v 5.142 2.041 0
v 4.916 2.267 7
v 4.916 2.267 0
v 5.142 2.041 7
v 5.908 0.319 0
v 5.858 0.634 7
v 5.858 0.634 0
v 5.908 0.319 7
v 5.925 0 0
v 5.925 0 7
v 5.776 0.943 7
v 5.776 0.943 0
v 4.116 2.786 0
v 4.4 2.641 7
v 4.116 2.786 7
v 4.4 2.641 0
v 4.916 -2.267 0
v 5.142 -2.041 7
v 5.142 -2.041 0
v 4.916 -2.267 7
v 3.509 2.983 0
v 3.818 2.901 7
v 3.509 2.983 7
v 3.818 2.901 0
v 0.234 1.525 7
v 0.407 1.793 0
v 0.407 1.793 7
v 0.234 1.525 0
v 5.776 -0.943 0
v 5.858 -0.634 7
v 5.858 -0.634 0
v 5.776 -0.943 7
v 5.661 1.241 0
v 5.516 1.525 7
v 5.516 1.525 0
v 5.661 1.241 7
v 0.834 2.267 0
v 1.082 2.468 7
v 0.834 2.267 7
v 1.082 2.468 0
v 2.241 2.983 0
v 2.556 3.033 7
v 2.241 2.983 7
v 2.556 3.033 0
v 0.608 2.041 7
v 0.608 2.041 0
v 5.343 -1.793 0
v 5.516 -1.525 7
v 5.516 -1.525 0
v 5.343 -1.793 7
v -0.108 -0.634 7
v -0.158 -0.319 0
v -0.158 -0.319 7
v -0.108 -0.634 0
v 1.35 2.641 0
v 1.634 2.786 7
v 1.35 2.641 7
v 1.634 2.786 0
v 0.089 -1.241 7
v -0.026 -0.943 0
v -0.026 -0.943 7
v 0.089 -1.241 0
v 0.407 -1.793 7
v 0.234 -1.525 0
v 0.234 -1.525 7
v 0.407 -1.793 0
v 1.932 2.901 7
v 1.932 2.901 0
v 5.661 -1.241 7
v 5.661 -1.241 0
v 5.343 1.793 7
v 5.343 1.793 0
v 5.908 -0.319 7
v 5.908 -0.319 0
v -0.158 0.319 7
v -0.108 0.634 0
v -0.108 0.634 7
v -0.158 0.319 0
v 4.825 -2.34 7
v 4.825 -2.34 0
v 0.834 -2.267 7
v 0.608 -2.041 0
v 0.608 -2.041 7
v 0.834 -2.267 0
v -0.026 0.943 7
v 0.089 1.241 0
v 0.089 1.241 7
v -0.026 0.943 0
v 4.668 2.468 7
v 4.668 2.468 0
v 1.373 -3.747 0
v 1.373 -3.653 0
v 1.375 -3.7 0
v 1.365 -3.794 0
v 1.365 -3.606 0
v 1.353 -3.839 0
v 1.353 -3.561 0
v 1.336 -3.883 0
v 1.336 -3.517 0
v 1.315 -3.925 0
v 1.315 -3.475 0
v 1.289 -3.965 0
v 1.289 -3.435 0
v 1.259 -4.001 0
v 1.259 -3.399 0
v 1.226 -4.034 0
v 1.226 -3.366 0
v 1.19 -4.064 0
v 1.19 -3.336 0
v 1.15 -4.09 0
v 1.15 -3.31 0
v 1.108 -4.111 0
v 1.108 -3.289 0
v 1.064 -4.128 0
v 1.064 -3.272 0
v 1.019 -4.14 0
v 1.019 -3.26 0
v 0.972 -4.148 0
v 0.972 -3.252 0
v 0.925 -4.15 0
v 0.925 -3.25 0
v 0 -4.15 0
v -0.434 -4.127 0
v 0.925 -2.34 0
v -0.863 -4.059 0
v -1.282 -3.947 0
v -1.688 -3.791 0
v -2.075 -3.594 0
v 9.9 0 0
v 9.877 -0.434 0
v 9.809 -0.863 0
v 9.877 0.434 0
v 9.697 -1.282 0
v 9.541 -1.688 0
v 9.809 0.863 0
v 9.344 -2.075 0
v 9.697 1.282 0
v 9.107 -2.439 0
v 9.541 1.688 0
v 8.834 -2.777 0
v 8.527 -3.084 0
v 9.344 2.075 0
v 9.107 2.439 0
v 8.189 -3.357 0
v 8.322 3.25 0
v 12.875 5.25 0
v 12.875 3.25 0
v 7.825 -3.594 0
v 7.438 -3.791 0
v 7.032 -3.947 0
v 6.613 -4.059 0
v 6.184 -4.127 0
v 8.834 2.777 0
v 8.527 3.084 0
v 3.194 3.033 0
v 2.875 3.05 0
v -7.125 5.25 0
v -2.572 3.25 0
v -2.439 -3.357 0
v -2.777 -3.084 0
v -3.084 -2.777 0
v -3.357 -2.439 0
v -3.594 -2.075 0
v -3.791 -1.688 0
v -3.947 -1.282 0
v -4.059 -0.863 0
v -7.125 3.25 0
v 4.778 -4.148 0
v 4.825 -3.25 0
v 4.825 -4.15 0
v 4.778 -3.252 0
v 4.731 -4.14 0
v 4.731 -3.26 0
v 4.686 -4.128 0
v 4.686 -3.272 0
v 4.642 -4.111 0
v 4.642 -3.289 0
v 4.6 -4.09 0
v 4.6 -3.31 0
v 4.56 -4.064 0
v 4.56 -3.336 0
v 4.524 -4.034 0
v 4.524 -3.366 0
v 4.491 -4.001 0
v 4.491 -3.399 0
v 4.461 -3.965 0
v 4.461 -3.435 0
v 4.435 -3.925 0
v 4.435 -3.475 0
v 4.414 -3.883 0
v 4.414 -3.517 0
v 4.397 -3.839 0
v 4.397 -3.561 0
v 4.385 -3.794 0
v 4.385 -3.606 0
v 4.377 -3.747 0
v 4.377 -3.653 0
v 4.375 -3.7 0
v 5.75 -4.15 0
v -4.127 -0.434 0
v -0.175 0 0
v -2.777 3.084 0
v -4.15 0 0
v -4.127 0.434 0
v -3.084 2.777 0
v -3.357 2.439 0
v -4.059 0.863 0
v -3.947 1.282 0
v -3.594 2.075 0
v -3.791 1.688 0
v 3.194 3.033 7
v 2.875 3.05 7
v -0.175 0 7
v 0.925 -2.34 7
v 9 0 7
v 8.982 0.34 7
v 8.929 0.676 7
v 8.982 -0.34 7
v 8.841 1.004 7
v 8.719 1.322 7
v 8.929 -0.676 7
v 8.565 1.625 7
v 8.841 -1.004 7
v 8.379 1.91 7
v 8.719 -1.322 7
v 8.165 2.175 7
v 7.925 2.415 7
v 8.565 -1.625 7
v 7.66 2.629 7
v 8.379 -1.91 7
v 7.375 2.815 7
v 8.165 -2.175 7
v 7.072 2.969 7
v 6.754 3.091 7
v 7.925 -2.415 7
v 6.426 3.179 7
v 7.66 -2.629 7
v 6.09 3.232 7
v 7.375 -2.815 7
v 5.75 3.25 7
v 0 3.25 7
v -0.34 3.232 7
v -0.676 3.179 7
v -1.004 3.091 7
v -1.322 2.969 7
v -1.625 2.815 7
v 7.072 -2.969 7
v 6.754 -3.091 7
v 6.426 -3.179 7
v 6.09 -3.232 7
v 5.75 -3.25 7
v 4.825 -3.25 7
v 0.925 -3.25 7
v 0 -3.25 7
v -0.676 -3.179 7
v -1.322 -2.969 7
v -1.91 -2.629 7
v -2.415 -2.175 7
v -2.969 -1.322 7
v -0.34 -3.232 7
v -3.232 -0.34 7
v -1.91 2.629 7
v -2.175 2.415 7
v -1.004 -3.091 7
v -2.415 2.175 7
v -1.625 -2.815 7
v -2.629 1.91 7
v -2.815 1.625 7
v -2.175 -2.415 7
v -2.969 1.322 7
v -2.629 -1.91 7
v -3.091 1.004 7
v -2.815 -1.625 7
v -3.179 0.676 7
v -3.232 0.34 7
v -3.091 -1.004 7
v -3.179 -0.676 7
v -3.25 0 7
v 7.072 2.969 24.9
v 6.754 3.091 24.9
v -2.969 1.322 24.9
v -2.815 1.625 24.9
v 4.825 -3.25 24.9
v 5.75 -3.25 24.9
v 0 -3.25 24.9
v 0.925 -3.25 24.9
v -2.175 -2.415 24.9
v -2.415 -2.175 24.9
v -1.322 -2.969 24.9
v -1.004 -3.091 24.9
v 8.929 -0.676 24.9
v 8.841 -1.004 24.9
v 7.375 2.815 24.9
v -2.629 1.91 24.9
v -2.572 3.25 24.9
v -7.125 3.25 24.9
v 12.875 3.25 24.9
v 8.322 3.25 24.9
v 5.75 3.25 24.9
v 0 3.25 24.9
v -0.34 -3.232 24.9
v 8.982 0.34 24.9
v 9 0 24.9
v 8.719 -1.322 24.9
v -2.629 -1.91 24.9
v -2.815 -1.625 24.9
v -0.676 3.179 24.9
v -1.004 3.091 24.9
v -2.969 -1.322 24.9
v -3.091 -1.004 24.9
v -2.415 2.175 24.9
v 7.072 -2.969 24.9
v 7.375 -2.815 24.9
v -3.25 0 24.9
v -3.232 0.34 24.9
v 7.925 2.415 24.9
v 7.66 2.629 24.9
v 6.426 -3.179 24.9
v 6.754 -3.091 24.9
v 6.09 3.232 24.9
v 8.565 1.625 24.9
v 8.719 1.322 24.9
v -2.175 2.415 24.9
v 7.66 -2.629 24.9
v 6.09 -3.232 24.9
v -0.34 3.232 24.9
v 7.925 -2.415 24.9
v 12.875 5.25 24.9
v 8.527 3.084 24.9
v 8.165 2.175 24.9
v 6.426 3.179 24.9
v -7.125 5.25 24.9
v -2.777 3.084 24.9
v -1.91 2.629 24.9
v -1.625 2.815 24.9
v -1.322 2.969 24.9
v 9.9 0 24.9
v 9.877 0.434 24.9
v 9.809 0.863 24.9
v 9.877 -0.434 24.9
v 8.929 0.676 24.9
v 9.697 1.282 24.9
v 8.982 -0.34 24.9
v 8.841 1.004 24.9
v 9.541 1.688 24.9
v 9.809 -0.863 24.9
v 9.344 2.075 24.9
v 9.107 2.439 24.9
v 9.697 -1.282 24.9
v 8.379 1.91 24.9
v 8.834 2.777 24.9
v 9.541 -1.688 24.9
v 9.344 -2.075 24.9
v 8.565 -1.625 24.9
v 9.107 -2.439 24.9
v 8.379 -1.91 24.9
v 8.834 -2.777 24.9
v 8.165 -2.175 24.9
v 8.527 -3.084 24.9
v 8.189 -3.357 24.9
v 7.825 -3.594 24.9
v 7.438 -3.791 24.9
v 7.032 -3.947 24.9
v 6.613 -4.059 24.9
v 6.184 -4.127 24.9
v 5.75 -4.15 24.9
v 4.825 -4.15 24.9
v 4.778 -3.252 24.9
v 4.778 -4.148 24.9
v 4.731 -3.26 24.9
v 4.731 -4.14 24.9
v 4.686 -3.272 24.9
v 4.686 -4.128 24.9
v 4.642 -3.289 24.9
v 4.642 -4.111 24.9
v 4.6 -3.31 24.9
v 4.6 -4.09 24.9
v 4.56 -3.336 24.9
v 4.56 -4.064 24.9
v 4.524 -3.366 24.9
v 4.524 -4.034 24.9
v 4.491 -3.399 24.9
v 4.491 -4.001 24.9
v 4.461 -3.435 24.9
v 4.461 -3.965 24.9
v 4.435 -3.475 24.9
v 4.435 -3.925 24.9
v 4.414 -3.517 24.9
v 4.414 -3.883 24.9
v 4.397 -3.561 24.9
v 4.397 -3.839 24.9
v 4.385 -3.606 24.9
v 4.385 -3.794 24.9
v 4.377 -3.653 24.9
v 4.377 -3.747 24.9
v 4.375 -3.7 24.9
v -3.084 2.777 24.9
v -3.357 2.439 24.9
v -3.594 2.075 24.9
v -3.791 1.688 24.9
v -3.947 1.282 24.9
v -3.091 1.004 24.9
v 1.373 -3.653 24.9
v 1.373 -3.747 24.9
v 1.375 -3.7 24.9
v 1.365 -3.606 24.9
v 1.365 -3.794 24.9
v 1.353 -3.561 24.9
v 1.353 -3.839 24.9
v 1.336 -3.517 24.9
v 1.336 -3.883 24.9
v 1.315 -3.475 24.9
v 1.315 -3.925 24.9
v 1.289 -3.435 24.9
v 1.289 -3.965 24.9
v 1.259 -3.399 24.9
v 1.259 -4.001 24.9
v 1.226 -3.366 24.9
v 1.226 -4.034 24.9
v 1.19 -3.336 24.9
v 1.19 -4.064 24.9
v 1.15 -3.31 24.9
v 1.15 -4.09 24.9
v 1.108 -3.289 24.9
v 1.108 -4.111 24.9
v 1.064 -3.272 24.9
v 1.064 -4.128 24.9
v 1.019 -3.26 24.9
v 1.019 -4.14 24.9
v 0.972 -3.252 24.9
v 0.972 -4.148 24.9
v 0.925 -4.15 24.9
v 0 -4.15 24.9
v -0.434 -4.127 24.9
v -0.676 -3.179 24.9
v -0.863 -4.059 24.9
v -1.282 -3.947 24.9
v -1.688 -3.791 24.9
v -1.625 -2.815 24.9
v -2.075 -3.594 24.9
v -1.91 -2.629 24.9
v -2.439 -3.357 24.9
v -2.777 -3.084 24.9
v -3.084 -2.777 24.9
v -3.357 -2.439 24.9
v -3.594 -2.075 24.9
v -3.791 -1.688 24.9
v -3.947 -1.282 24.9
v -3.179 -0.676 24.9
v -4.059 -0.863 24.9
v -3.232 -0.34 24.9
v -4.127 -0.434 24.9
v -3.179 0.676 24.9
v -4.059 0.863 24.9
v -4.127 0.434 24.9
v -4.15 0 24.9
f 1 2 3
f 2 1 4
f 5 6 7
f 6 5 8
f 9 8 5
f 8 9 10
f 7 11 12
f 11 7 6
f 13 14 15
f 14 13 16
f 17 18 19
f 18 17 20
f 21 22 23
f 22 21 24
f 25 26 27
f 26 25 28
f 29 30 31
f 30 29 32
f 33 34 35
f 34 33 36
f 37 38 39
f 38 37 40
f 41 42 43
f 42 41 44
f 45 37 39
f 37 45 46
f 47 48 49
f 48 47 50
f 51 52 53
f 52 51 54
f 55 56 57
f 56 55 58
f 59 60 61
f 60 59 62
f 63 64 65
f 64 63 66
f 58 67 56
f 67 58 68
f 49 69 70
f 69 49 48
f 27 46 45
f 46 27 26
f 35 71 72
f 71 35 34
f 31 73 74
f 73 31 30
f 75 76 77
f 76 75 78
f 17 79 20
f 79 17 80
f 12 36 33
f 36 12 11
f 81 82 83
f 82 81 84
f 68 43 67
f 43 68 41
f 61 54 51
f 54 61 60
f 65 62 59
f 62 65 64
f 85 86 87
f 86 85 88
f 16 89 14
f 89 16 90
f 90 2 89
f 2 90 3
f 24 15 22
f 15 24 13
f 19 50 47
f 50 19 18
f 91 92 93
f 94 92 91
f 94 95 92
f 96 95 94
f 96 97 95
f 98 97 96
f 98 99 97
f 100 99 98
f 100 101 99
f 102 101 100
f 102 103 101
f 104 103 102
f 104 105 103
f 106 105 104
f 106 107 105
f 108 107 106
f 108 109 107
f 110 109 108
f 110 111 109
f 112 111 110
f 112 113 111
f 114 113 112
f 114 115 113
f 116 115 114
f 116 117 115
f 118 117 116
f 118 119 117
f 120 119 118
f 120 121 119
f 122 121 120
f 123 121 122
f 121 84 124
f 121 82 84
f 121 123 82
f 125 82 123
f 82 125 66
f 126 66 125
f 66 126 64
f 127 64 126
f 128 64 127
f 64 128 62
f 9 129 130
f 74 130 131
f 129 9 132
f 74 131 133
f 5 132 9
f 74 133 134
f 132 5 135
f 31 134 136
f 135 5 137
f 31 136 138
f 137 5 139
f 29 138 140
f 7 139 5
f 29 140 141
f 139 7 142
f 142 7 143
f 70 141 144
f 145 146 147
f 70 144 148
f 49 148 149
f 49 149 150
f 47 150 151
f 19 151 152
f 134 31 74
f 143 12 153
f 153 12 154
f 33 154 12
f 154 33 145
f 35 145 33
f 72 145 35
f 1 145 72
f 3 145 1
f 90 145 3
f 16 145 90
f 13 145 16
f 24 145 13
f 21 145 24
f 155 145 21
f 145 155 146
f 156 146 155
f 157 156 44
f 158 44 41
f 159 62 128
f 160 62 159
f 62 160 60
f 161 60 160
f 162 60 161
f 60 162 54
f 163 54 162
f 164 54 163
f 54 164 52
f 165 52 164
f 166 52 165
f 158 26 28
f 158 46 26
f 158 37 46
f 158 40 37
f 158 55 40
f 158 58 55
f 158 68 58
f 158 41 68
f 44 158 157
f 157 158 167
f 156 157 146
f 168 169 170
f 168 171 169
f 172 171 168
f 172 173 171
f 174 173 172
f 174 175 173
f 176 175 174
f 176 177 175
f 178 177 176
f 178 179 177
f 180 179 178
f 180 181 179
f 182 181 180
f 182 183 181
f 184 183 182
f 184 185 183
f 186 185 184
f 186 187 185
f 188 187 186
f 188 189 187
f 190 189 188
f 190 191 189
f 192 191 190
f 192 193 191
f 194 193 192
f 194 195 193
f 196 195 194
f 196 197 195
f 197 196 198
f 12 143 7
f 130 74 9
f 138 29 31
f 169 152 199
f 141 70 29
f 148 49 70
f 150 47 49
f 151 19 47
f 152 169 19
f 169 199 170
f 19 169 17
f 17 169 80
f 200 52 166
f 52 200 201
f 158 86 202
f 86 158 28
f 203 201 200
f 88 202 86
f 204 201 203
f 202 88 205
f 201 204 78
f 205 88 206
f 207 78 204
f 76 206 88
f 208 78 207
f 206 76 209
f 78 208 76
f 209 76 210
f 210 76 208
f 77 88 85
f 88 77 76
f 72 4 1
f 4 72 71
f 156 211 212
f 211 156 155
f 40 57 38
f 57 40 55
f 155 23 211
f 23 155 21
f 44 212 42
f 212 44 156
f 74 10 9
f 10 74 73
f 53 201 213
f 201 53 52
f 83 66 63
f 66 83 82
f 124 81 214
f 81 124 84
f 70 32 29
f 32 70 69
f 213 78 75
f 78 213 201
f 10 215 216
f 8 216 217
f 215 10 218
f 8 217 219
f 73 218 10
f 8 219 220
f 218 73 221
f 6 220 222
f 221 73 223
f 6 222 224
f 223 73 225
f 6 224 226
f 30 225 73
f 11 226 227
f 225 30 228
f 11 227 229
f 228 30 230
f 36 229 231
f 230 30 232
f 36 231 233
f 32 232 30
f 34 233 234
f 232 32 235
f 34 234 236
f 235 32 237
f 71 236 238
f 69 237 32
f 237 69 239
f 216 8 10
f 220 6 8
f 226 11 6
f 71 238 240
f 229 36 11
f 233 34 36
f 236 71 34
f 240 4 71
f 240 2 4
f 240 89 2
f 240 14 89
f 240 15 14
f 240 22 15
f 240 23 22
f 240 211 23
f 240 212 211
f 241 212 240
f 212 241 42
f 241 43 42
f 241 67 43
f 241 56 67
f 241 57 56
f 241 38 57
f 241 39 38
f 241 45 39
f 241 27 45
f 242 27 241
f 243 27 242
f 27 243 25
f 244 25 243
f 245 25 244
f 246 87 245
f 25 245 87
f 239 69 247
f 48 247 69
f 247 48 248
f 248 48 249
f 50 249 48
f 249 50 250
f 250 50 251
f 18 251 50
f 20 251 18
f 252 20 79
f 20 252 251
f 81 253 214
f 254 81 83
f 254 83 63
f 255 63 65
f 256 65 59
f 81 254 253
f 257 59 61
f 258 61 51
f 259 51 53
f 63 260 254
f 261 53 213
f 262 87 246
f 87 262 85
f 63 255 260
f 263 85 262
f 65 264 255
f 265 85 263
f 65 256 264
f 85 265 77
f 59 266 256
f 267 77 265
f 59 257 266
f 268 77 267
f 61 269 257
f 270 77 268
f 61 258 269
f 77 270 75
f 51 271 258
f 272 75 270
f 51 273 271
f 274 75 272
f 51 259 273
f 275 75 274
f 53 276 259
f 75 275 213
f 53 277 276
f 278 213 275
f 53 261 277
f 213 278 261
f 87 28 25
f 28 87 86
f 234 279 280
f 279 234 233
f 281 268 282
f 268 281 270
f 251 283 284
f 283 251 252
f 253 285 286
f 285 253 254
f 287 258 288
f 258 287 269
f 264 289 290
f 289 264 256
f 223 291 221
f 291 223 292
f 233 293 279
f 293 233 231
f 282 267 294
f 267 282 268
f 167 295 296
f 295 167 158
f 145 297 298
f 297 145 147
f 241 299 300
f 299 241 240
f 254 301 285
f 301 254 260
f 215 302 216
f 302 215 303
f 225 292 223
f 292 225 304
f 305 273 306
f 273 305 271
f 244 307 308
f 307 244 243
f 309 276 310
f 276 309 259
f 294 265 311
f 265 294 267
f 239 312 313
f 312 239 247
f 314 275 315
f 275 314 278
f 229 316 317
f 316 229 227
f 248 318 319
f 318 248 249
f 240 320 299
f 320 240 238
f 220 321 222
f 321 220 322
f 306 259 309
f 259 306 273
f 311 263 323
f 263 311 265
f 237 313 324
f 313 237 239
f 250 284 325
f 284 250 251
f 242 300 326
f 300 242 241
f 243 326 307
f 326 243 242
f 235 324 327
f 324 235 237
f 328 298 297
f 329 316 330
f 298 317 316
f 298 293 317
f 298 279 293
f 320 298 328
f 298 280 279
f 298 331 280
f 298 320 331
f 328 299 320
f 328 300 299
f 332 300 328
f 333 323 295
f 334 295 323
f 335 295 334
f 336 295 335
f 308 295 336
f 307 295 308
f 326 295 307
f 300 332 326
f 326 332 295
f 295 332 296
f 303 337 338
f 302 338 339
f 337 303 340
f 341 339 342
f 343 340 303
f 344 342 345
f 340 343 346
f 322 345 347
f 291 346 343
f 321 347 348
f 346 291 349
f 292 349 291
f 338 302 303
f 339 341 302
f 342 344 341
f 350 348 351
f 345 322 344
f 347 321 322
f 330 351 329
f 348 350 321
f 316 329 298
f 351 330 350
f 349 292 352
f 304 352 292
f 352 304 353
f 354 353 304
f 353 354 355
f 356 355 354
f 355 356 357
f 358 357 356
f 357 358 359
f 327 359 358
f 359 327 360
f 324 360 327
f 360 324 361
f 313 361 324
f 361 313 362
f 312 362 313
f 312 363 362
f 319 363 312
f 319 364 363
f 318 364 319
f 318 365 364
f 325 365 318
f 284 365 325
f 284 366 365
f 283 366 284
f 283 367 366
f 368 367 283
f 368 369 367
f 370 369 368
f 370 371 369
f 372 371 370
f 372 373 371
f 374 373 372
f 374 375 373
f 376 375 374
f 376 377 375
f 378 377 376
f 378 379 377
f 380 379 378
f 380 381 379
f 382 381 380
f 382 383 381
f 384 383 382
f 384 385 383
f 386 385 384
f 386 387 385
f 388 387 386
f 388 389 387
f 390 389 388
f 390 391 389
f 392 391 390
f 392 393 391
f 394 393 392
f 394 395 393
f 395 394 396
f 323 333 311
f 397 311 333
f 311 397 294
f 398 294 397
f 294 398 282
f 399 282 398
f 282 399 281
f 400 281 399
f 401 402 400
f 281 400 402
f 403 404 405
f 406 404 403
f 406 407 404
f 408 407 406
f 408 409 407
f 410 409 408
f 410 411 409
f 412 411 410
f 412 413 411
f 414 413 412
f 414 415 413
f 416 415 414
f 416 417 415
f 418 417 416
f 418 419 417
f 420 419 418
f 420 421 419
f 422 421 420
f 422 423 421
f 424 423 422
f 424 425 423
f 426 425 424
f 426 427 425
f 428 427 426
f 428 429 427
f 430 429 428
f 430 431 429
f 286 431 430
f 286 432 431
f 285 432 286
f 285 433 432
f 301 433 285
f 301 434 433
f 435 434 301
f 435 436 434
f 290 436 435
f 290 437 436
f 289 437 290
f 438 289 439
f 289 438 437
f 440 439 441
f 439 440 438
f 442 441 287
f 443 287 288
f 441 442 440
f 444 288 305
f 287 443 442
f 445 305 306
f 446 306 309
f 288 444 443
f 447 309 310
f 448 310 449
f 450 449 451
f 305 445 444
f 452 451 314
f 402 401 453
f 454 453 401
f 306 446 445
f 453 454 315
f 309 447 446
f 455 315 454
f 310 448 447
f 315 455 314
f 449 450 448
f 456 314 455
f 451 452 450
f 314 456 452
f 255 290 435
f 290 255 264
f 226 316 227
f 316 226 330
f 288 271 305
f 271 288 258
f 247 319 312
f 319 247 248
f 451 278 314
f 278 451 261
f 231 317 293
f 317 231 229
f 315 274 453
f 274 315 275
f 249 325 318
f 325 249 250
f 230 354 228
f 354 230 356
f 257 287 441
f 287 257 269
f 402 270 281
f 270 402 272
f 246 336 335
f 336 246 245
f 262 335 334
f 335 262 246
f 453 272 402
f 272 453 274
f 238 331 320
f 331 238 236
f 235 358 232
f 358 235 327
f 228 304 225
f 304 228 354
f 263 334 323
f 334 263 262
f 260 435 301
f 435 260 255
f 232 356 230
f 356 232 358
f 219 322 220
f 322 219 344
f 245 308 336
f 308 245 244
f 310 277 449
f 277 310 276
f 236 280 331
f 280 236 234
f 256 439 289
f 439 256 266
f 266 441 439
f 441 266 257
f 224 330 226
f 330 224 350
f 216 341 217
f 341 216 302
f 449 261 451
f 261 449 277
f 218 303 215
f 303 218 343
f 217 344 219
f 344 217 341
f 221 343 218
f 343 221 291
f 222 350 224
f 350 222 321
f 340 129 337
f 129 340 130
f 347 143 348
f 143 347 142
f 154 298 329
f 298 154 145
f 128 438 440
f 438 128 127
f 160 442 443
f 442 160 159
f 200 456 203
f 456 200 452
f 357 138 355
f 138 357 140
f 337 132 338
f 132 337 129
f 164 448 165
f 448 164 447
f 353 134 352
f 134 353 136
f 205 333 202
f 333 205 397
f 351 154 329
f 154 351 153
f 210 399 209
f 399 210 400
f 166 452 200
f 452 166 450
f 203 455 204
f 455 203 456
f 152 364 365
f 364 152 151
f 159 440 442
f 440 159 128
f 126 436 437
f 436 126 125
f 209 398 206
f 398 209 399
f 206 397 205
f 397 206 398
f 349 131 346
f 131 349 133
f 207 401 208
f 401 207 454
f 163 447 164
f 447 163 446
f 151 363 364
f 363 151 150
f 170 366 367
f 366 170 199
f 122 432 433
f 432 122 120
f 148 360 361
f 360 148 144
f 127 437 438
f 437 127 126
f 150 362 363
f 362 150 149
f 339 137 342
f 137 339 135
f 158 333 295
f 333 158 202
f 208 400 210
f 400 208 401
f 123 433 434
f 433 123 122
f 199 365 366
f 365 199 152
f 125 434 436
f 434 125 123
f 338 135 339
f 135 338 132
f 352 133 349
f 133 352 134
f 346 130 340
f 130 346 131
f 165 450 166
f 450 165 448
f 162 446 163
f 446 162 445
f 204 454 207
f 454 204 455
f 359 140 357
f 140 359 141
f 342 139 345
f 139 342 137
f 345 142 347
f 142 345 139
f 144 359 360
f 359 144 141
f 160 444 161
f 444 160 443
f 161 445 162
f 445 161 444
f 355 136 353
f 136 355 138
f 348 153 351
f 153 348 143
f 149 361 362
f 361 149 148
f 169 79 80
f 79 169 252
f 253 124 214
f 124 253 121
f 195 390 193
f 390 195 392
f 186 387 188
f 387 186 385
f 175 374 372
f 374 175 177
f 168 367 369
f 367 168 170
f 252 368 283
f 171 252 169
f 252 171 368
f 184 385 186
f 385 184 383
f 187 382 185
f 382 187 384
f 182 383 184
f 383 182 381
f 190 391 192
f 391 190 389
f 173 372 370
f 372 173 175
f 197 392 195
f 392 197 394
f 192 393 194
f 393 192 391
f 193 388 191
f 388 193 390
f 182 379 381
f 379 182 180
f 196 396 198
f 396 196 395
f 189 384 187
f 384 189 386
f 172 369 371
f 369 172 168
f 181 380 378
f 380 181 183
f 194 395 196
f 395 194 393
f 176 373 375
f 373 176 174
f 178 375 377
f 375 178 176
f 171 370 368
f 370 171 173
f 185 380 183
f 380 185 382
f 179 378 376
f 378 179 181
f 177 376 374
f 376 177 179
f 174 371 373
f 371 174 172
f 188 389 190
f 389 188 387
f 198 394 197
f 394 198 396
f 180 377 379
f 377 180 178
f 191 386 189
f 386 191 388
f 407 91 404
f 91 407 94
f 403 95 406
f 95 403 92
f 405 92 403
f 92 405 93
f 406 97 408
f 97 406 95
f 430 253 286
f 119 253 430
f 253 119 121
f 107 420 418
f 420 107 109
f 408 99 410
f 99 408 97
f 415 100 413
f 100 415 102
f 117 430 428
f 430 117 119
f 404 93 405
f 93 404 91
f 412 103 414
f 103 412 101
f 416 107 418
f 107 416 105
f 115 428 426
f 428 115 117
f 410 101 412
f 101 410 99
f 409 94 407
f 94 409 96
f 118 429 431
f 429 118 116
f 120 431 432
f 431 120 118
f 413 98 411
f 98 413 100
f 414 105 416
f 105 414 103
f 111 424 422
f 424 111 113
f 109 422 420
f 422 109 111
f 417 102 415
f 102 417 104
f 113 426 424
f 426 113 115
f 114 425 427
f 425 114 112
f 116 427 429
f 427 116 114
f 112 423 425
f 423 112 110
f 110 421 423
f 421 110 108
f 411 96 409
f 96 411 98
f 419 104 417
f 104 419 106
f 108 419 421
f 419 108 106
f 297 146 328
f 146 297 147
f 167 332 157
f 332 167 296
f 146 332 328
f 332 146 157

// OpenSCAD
$fn=60;


//dashcable();

//translate([15,0,0]) 
	mount_dashcable();


module dashcable(swell=[for (i=[0:6]) 0])
{
	length=17.9+swell[0]; width=12.05+swell[1]; depth=6.3+swell[2];
	color("lightgrey") hull()
	{
		cylinder(h=length,d=depth);
		translate([width-depth,0,0])
			cylinder(h=length,d=depth);
	}
	diams=[5.6+swell[3],3.6+swell[4]];
	height=[7+swell[5],10+swell[6]];
	color("darkred") translate([width/2-depth/2,0,0])
	{
		for (i=[0:1])
		{
			translate([0,0,-height[i]])
				cylinder(h=height[i],d=diams[i]);
		}
	}
}
module mount_dashcable()
{
	h=7;
	length=17.9+h; width=12.05+2; depth=6.3+2;
	d=3;
	_d=(depth-(depth-2+0.2))/2;
	translate([width/2-depth/2-10,(depth-2+0.2)/2,0])
		cube([20,2,length]);

	difference()
	{
		color("grey") hull()
		{
			cylinder(h=length,d=depth);
			translate([width-depth,0,0])
				cylinder(h=length,d=depth);
		}
		translate([0,0,h])
			dashcable([0,0.2,0.2,0.5,0,0,0]);
		translate([width/2-depth/2,-depth/2,0])
		{
			translate([-d/2-_d/2,0,0])
				cube([d+_d,depth/2,100]);
		}
	}
	for (i=[-1:2:1])
	{
		translate([width/2-depth/2+i*(-d/2-_d/2),-depth/2+_d/2,0])
			cylinder(h=length,d=_d);
	}
}
